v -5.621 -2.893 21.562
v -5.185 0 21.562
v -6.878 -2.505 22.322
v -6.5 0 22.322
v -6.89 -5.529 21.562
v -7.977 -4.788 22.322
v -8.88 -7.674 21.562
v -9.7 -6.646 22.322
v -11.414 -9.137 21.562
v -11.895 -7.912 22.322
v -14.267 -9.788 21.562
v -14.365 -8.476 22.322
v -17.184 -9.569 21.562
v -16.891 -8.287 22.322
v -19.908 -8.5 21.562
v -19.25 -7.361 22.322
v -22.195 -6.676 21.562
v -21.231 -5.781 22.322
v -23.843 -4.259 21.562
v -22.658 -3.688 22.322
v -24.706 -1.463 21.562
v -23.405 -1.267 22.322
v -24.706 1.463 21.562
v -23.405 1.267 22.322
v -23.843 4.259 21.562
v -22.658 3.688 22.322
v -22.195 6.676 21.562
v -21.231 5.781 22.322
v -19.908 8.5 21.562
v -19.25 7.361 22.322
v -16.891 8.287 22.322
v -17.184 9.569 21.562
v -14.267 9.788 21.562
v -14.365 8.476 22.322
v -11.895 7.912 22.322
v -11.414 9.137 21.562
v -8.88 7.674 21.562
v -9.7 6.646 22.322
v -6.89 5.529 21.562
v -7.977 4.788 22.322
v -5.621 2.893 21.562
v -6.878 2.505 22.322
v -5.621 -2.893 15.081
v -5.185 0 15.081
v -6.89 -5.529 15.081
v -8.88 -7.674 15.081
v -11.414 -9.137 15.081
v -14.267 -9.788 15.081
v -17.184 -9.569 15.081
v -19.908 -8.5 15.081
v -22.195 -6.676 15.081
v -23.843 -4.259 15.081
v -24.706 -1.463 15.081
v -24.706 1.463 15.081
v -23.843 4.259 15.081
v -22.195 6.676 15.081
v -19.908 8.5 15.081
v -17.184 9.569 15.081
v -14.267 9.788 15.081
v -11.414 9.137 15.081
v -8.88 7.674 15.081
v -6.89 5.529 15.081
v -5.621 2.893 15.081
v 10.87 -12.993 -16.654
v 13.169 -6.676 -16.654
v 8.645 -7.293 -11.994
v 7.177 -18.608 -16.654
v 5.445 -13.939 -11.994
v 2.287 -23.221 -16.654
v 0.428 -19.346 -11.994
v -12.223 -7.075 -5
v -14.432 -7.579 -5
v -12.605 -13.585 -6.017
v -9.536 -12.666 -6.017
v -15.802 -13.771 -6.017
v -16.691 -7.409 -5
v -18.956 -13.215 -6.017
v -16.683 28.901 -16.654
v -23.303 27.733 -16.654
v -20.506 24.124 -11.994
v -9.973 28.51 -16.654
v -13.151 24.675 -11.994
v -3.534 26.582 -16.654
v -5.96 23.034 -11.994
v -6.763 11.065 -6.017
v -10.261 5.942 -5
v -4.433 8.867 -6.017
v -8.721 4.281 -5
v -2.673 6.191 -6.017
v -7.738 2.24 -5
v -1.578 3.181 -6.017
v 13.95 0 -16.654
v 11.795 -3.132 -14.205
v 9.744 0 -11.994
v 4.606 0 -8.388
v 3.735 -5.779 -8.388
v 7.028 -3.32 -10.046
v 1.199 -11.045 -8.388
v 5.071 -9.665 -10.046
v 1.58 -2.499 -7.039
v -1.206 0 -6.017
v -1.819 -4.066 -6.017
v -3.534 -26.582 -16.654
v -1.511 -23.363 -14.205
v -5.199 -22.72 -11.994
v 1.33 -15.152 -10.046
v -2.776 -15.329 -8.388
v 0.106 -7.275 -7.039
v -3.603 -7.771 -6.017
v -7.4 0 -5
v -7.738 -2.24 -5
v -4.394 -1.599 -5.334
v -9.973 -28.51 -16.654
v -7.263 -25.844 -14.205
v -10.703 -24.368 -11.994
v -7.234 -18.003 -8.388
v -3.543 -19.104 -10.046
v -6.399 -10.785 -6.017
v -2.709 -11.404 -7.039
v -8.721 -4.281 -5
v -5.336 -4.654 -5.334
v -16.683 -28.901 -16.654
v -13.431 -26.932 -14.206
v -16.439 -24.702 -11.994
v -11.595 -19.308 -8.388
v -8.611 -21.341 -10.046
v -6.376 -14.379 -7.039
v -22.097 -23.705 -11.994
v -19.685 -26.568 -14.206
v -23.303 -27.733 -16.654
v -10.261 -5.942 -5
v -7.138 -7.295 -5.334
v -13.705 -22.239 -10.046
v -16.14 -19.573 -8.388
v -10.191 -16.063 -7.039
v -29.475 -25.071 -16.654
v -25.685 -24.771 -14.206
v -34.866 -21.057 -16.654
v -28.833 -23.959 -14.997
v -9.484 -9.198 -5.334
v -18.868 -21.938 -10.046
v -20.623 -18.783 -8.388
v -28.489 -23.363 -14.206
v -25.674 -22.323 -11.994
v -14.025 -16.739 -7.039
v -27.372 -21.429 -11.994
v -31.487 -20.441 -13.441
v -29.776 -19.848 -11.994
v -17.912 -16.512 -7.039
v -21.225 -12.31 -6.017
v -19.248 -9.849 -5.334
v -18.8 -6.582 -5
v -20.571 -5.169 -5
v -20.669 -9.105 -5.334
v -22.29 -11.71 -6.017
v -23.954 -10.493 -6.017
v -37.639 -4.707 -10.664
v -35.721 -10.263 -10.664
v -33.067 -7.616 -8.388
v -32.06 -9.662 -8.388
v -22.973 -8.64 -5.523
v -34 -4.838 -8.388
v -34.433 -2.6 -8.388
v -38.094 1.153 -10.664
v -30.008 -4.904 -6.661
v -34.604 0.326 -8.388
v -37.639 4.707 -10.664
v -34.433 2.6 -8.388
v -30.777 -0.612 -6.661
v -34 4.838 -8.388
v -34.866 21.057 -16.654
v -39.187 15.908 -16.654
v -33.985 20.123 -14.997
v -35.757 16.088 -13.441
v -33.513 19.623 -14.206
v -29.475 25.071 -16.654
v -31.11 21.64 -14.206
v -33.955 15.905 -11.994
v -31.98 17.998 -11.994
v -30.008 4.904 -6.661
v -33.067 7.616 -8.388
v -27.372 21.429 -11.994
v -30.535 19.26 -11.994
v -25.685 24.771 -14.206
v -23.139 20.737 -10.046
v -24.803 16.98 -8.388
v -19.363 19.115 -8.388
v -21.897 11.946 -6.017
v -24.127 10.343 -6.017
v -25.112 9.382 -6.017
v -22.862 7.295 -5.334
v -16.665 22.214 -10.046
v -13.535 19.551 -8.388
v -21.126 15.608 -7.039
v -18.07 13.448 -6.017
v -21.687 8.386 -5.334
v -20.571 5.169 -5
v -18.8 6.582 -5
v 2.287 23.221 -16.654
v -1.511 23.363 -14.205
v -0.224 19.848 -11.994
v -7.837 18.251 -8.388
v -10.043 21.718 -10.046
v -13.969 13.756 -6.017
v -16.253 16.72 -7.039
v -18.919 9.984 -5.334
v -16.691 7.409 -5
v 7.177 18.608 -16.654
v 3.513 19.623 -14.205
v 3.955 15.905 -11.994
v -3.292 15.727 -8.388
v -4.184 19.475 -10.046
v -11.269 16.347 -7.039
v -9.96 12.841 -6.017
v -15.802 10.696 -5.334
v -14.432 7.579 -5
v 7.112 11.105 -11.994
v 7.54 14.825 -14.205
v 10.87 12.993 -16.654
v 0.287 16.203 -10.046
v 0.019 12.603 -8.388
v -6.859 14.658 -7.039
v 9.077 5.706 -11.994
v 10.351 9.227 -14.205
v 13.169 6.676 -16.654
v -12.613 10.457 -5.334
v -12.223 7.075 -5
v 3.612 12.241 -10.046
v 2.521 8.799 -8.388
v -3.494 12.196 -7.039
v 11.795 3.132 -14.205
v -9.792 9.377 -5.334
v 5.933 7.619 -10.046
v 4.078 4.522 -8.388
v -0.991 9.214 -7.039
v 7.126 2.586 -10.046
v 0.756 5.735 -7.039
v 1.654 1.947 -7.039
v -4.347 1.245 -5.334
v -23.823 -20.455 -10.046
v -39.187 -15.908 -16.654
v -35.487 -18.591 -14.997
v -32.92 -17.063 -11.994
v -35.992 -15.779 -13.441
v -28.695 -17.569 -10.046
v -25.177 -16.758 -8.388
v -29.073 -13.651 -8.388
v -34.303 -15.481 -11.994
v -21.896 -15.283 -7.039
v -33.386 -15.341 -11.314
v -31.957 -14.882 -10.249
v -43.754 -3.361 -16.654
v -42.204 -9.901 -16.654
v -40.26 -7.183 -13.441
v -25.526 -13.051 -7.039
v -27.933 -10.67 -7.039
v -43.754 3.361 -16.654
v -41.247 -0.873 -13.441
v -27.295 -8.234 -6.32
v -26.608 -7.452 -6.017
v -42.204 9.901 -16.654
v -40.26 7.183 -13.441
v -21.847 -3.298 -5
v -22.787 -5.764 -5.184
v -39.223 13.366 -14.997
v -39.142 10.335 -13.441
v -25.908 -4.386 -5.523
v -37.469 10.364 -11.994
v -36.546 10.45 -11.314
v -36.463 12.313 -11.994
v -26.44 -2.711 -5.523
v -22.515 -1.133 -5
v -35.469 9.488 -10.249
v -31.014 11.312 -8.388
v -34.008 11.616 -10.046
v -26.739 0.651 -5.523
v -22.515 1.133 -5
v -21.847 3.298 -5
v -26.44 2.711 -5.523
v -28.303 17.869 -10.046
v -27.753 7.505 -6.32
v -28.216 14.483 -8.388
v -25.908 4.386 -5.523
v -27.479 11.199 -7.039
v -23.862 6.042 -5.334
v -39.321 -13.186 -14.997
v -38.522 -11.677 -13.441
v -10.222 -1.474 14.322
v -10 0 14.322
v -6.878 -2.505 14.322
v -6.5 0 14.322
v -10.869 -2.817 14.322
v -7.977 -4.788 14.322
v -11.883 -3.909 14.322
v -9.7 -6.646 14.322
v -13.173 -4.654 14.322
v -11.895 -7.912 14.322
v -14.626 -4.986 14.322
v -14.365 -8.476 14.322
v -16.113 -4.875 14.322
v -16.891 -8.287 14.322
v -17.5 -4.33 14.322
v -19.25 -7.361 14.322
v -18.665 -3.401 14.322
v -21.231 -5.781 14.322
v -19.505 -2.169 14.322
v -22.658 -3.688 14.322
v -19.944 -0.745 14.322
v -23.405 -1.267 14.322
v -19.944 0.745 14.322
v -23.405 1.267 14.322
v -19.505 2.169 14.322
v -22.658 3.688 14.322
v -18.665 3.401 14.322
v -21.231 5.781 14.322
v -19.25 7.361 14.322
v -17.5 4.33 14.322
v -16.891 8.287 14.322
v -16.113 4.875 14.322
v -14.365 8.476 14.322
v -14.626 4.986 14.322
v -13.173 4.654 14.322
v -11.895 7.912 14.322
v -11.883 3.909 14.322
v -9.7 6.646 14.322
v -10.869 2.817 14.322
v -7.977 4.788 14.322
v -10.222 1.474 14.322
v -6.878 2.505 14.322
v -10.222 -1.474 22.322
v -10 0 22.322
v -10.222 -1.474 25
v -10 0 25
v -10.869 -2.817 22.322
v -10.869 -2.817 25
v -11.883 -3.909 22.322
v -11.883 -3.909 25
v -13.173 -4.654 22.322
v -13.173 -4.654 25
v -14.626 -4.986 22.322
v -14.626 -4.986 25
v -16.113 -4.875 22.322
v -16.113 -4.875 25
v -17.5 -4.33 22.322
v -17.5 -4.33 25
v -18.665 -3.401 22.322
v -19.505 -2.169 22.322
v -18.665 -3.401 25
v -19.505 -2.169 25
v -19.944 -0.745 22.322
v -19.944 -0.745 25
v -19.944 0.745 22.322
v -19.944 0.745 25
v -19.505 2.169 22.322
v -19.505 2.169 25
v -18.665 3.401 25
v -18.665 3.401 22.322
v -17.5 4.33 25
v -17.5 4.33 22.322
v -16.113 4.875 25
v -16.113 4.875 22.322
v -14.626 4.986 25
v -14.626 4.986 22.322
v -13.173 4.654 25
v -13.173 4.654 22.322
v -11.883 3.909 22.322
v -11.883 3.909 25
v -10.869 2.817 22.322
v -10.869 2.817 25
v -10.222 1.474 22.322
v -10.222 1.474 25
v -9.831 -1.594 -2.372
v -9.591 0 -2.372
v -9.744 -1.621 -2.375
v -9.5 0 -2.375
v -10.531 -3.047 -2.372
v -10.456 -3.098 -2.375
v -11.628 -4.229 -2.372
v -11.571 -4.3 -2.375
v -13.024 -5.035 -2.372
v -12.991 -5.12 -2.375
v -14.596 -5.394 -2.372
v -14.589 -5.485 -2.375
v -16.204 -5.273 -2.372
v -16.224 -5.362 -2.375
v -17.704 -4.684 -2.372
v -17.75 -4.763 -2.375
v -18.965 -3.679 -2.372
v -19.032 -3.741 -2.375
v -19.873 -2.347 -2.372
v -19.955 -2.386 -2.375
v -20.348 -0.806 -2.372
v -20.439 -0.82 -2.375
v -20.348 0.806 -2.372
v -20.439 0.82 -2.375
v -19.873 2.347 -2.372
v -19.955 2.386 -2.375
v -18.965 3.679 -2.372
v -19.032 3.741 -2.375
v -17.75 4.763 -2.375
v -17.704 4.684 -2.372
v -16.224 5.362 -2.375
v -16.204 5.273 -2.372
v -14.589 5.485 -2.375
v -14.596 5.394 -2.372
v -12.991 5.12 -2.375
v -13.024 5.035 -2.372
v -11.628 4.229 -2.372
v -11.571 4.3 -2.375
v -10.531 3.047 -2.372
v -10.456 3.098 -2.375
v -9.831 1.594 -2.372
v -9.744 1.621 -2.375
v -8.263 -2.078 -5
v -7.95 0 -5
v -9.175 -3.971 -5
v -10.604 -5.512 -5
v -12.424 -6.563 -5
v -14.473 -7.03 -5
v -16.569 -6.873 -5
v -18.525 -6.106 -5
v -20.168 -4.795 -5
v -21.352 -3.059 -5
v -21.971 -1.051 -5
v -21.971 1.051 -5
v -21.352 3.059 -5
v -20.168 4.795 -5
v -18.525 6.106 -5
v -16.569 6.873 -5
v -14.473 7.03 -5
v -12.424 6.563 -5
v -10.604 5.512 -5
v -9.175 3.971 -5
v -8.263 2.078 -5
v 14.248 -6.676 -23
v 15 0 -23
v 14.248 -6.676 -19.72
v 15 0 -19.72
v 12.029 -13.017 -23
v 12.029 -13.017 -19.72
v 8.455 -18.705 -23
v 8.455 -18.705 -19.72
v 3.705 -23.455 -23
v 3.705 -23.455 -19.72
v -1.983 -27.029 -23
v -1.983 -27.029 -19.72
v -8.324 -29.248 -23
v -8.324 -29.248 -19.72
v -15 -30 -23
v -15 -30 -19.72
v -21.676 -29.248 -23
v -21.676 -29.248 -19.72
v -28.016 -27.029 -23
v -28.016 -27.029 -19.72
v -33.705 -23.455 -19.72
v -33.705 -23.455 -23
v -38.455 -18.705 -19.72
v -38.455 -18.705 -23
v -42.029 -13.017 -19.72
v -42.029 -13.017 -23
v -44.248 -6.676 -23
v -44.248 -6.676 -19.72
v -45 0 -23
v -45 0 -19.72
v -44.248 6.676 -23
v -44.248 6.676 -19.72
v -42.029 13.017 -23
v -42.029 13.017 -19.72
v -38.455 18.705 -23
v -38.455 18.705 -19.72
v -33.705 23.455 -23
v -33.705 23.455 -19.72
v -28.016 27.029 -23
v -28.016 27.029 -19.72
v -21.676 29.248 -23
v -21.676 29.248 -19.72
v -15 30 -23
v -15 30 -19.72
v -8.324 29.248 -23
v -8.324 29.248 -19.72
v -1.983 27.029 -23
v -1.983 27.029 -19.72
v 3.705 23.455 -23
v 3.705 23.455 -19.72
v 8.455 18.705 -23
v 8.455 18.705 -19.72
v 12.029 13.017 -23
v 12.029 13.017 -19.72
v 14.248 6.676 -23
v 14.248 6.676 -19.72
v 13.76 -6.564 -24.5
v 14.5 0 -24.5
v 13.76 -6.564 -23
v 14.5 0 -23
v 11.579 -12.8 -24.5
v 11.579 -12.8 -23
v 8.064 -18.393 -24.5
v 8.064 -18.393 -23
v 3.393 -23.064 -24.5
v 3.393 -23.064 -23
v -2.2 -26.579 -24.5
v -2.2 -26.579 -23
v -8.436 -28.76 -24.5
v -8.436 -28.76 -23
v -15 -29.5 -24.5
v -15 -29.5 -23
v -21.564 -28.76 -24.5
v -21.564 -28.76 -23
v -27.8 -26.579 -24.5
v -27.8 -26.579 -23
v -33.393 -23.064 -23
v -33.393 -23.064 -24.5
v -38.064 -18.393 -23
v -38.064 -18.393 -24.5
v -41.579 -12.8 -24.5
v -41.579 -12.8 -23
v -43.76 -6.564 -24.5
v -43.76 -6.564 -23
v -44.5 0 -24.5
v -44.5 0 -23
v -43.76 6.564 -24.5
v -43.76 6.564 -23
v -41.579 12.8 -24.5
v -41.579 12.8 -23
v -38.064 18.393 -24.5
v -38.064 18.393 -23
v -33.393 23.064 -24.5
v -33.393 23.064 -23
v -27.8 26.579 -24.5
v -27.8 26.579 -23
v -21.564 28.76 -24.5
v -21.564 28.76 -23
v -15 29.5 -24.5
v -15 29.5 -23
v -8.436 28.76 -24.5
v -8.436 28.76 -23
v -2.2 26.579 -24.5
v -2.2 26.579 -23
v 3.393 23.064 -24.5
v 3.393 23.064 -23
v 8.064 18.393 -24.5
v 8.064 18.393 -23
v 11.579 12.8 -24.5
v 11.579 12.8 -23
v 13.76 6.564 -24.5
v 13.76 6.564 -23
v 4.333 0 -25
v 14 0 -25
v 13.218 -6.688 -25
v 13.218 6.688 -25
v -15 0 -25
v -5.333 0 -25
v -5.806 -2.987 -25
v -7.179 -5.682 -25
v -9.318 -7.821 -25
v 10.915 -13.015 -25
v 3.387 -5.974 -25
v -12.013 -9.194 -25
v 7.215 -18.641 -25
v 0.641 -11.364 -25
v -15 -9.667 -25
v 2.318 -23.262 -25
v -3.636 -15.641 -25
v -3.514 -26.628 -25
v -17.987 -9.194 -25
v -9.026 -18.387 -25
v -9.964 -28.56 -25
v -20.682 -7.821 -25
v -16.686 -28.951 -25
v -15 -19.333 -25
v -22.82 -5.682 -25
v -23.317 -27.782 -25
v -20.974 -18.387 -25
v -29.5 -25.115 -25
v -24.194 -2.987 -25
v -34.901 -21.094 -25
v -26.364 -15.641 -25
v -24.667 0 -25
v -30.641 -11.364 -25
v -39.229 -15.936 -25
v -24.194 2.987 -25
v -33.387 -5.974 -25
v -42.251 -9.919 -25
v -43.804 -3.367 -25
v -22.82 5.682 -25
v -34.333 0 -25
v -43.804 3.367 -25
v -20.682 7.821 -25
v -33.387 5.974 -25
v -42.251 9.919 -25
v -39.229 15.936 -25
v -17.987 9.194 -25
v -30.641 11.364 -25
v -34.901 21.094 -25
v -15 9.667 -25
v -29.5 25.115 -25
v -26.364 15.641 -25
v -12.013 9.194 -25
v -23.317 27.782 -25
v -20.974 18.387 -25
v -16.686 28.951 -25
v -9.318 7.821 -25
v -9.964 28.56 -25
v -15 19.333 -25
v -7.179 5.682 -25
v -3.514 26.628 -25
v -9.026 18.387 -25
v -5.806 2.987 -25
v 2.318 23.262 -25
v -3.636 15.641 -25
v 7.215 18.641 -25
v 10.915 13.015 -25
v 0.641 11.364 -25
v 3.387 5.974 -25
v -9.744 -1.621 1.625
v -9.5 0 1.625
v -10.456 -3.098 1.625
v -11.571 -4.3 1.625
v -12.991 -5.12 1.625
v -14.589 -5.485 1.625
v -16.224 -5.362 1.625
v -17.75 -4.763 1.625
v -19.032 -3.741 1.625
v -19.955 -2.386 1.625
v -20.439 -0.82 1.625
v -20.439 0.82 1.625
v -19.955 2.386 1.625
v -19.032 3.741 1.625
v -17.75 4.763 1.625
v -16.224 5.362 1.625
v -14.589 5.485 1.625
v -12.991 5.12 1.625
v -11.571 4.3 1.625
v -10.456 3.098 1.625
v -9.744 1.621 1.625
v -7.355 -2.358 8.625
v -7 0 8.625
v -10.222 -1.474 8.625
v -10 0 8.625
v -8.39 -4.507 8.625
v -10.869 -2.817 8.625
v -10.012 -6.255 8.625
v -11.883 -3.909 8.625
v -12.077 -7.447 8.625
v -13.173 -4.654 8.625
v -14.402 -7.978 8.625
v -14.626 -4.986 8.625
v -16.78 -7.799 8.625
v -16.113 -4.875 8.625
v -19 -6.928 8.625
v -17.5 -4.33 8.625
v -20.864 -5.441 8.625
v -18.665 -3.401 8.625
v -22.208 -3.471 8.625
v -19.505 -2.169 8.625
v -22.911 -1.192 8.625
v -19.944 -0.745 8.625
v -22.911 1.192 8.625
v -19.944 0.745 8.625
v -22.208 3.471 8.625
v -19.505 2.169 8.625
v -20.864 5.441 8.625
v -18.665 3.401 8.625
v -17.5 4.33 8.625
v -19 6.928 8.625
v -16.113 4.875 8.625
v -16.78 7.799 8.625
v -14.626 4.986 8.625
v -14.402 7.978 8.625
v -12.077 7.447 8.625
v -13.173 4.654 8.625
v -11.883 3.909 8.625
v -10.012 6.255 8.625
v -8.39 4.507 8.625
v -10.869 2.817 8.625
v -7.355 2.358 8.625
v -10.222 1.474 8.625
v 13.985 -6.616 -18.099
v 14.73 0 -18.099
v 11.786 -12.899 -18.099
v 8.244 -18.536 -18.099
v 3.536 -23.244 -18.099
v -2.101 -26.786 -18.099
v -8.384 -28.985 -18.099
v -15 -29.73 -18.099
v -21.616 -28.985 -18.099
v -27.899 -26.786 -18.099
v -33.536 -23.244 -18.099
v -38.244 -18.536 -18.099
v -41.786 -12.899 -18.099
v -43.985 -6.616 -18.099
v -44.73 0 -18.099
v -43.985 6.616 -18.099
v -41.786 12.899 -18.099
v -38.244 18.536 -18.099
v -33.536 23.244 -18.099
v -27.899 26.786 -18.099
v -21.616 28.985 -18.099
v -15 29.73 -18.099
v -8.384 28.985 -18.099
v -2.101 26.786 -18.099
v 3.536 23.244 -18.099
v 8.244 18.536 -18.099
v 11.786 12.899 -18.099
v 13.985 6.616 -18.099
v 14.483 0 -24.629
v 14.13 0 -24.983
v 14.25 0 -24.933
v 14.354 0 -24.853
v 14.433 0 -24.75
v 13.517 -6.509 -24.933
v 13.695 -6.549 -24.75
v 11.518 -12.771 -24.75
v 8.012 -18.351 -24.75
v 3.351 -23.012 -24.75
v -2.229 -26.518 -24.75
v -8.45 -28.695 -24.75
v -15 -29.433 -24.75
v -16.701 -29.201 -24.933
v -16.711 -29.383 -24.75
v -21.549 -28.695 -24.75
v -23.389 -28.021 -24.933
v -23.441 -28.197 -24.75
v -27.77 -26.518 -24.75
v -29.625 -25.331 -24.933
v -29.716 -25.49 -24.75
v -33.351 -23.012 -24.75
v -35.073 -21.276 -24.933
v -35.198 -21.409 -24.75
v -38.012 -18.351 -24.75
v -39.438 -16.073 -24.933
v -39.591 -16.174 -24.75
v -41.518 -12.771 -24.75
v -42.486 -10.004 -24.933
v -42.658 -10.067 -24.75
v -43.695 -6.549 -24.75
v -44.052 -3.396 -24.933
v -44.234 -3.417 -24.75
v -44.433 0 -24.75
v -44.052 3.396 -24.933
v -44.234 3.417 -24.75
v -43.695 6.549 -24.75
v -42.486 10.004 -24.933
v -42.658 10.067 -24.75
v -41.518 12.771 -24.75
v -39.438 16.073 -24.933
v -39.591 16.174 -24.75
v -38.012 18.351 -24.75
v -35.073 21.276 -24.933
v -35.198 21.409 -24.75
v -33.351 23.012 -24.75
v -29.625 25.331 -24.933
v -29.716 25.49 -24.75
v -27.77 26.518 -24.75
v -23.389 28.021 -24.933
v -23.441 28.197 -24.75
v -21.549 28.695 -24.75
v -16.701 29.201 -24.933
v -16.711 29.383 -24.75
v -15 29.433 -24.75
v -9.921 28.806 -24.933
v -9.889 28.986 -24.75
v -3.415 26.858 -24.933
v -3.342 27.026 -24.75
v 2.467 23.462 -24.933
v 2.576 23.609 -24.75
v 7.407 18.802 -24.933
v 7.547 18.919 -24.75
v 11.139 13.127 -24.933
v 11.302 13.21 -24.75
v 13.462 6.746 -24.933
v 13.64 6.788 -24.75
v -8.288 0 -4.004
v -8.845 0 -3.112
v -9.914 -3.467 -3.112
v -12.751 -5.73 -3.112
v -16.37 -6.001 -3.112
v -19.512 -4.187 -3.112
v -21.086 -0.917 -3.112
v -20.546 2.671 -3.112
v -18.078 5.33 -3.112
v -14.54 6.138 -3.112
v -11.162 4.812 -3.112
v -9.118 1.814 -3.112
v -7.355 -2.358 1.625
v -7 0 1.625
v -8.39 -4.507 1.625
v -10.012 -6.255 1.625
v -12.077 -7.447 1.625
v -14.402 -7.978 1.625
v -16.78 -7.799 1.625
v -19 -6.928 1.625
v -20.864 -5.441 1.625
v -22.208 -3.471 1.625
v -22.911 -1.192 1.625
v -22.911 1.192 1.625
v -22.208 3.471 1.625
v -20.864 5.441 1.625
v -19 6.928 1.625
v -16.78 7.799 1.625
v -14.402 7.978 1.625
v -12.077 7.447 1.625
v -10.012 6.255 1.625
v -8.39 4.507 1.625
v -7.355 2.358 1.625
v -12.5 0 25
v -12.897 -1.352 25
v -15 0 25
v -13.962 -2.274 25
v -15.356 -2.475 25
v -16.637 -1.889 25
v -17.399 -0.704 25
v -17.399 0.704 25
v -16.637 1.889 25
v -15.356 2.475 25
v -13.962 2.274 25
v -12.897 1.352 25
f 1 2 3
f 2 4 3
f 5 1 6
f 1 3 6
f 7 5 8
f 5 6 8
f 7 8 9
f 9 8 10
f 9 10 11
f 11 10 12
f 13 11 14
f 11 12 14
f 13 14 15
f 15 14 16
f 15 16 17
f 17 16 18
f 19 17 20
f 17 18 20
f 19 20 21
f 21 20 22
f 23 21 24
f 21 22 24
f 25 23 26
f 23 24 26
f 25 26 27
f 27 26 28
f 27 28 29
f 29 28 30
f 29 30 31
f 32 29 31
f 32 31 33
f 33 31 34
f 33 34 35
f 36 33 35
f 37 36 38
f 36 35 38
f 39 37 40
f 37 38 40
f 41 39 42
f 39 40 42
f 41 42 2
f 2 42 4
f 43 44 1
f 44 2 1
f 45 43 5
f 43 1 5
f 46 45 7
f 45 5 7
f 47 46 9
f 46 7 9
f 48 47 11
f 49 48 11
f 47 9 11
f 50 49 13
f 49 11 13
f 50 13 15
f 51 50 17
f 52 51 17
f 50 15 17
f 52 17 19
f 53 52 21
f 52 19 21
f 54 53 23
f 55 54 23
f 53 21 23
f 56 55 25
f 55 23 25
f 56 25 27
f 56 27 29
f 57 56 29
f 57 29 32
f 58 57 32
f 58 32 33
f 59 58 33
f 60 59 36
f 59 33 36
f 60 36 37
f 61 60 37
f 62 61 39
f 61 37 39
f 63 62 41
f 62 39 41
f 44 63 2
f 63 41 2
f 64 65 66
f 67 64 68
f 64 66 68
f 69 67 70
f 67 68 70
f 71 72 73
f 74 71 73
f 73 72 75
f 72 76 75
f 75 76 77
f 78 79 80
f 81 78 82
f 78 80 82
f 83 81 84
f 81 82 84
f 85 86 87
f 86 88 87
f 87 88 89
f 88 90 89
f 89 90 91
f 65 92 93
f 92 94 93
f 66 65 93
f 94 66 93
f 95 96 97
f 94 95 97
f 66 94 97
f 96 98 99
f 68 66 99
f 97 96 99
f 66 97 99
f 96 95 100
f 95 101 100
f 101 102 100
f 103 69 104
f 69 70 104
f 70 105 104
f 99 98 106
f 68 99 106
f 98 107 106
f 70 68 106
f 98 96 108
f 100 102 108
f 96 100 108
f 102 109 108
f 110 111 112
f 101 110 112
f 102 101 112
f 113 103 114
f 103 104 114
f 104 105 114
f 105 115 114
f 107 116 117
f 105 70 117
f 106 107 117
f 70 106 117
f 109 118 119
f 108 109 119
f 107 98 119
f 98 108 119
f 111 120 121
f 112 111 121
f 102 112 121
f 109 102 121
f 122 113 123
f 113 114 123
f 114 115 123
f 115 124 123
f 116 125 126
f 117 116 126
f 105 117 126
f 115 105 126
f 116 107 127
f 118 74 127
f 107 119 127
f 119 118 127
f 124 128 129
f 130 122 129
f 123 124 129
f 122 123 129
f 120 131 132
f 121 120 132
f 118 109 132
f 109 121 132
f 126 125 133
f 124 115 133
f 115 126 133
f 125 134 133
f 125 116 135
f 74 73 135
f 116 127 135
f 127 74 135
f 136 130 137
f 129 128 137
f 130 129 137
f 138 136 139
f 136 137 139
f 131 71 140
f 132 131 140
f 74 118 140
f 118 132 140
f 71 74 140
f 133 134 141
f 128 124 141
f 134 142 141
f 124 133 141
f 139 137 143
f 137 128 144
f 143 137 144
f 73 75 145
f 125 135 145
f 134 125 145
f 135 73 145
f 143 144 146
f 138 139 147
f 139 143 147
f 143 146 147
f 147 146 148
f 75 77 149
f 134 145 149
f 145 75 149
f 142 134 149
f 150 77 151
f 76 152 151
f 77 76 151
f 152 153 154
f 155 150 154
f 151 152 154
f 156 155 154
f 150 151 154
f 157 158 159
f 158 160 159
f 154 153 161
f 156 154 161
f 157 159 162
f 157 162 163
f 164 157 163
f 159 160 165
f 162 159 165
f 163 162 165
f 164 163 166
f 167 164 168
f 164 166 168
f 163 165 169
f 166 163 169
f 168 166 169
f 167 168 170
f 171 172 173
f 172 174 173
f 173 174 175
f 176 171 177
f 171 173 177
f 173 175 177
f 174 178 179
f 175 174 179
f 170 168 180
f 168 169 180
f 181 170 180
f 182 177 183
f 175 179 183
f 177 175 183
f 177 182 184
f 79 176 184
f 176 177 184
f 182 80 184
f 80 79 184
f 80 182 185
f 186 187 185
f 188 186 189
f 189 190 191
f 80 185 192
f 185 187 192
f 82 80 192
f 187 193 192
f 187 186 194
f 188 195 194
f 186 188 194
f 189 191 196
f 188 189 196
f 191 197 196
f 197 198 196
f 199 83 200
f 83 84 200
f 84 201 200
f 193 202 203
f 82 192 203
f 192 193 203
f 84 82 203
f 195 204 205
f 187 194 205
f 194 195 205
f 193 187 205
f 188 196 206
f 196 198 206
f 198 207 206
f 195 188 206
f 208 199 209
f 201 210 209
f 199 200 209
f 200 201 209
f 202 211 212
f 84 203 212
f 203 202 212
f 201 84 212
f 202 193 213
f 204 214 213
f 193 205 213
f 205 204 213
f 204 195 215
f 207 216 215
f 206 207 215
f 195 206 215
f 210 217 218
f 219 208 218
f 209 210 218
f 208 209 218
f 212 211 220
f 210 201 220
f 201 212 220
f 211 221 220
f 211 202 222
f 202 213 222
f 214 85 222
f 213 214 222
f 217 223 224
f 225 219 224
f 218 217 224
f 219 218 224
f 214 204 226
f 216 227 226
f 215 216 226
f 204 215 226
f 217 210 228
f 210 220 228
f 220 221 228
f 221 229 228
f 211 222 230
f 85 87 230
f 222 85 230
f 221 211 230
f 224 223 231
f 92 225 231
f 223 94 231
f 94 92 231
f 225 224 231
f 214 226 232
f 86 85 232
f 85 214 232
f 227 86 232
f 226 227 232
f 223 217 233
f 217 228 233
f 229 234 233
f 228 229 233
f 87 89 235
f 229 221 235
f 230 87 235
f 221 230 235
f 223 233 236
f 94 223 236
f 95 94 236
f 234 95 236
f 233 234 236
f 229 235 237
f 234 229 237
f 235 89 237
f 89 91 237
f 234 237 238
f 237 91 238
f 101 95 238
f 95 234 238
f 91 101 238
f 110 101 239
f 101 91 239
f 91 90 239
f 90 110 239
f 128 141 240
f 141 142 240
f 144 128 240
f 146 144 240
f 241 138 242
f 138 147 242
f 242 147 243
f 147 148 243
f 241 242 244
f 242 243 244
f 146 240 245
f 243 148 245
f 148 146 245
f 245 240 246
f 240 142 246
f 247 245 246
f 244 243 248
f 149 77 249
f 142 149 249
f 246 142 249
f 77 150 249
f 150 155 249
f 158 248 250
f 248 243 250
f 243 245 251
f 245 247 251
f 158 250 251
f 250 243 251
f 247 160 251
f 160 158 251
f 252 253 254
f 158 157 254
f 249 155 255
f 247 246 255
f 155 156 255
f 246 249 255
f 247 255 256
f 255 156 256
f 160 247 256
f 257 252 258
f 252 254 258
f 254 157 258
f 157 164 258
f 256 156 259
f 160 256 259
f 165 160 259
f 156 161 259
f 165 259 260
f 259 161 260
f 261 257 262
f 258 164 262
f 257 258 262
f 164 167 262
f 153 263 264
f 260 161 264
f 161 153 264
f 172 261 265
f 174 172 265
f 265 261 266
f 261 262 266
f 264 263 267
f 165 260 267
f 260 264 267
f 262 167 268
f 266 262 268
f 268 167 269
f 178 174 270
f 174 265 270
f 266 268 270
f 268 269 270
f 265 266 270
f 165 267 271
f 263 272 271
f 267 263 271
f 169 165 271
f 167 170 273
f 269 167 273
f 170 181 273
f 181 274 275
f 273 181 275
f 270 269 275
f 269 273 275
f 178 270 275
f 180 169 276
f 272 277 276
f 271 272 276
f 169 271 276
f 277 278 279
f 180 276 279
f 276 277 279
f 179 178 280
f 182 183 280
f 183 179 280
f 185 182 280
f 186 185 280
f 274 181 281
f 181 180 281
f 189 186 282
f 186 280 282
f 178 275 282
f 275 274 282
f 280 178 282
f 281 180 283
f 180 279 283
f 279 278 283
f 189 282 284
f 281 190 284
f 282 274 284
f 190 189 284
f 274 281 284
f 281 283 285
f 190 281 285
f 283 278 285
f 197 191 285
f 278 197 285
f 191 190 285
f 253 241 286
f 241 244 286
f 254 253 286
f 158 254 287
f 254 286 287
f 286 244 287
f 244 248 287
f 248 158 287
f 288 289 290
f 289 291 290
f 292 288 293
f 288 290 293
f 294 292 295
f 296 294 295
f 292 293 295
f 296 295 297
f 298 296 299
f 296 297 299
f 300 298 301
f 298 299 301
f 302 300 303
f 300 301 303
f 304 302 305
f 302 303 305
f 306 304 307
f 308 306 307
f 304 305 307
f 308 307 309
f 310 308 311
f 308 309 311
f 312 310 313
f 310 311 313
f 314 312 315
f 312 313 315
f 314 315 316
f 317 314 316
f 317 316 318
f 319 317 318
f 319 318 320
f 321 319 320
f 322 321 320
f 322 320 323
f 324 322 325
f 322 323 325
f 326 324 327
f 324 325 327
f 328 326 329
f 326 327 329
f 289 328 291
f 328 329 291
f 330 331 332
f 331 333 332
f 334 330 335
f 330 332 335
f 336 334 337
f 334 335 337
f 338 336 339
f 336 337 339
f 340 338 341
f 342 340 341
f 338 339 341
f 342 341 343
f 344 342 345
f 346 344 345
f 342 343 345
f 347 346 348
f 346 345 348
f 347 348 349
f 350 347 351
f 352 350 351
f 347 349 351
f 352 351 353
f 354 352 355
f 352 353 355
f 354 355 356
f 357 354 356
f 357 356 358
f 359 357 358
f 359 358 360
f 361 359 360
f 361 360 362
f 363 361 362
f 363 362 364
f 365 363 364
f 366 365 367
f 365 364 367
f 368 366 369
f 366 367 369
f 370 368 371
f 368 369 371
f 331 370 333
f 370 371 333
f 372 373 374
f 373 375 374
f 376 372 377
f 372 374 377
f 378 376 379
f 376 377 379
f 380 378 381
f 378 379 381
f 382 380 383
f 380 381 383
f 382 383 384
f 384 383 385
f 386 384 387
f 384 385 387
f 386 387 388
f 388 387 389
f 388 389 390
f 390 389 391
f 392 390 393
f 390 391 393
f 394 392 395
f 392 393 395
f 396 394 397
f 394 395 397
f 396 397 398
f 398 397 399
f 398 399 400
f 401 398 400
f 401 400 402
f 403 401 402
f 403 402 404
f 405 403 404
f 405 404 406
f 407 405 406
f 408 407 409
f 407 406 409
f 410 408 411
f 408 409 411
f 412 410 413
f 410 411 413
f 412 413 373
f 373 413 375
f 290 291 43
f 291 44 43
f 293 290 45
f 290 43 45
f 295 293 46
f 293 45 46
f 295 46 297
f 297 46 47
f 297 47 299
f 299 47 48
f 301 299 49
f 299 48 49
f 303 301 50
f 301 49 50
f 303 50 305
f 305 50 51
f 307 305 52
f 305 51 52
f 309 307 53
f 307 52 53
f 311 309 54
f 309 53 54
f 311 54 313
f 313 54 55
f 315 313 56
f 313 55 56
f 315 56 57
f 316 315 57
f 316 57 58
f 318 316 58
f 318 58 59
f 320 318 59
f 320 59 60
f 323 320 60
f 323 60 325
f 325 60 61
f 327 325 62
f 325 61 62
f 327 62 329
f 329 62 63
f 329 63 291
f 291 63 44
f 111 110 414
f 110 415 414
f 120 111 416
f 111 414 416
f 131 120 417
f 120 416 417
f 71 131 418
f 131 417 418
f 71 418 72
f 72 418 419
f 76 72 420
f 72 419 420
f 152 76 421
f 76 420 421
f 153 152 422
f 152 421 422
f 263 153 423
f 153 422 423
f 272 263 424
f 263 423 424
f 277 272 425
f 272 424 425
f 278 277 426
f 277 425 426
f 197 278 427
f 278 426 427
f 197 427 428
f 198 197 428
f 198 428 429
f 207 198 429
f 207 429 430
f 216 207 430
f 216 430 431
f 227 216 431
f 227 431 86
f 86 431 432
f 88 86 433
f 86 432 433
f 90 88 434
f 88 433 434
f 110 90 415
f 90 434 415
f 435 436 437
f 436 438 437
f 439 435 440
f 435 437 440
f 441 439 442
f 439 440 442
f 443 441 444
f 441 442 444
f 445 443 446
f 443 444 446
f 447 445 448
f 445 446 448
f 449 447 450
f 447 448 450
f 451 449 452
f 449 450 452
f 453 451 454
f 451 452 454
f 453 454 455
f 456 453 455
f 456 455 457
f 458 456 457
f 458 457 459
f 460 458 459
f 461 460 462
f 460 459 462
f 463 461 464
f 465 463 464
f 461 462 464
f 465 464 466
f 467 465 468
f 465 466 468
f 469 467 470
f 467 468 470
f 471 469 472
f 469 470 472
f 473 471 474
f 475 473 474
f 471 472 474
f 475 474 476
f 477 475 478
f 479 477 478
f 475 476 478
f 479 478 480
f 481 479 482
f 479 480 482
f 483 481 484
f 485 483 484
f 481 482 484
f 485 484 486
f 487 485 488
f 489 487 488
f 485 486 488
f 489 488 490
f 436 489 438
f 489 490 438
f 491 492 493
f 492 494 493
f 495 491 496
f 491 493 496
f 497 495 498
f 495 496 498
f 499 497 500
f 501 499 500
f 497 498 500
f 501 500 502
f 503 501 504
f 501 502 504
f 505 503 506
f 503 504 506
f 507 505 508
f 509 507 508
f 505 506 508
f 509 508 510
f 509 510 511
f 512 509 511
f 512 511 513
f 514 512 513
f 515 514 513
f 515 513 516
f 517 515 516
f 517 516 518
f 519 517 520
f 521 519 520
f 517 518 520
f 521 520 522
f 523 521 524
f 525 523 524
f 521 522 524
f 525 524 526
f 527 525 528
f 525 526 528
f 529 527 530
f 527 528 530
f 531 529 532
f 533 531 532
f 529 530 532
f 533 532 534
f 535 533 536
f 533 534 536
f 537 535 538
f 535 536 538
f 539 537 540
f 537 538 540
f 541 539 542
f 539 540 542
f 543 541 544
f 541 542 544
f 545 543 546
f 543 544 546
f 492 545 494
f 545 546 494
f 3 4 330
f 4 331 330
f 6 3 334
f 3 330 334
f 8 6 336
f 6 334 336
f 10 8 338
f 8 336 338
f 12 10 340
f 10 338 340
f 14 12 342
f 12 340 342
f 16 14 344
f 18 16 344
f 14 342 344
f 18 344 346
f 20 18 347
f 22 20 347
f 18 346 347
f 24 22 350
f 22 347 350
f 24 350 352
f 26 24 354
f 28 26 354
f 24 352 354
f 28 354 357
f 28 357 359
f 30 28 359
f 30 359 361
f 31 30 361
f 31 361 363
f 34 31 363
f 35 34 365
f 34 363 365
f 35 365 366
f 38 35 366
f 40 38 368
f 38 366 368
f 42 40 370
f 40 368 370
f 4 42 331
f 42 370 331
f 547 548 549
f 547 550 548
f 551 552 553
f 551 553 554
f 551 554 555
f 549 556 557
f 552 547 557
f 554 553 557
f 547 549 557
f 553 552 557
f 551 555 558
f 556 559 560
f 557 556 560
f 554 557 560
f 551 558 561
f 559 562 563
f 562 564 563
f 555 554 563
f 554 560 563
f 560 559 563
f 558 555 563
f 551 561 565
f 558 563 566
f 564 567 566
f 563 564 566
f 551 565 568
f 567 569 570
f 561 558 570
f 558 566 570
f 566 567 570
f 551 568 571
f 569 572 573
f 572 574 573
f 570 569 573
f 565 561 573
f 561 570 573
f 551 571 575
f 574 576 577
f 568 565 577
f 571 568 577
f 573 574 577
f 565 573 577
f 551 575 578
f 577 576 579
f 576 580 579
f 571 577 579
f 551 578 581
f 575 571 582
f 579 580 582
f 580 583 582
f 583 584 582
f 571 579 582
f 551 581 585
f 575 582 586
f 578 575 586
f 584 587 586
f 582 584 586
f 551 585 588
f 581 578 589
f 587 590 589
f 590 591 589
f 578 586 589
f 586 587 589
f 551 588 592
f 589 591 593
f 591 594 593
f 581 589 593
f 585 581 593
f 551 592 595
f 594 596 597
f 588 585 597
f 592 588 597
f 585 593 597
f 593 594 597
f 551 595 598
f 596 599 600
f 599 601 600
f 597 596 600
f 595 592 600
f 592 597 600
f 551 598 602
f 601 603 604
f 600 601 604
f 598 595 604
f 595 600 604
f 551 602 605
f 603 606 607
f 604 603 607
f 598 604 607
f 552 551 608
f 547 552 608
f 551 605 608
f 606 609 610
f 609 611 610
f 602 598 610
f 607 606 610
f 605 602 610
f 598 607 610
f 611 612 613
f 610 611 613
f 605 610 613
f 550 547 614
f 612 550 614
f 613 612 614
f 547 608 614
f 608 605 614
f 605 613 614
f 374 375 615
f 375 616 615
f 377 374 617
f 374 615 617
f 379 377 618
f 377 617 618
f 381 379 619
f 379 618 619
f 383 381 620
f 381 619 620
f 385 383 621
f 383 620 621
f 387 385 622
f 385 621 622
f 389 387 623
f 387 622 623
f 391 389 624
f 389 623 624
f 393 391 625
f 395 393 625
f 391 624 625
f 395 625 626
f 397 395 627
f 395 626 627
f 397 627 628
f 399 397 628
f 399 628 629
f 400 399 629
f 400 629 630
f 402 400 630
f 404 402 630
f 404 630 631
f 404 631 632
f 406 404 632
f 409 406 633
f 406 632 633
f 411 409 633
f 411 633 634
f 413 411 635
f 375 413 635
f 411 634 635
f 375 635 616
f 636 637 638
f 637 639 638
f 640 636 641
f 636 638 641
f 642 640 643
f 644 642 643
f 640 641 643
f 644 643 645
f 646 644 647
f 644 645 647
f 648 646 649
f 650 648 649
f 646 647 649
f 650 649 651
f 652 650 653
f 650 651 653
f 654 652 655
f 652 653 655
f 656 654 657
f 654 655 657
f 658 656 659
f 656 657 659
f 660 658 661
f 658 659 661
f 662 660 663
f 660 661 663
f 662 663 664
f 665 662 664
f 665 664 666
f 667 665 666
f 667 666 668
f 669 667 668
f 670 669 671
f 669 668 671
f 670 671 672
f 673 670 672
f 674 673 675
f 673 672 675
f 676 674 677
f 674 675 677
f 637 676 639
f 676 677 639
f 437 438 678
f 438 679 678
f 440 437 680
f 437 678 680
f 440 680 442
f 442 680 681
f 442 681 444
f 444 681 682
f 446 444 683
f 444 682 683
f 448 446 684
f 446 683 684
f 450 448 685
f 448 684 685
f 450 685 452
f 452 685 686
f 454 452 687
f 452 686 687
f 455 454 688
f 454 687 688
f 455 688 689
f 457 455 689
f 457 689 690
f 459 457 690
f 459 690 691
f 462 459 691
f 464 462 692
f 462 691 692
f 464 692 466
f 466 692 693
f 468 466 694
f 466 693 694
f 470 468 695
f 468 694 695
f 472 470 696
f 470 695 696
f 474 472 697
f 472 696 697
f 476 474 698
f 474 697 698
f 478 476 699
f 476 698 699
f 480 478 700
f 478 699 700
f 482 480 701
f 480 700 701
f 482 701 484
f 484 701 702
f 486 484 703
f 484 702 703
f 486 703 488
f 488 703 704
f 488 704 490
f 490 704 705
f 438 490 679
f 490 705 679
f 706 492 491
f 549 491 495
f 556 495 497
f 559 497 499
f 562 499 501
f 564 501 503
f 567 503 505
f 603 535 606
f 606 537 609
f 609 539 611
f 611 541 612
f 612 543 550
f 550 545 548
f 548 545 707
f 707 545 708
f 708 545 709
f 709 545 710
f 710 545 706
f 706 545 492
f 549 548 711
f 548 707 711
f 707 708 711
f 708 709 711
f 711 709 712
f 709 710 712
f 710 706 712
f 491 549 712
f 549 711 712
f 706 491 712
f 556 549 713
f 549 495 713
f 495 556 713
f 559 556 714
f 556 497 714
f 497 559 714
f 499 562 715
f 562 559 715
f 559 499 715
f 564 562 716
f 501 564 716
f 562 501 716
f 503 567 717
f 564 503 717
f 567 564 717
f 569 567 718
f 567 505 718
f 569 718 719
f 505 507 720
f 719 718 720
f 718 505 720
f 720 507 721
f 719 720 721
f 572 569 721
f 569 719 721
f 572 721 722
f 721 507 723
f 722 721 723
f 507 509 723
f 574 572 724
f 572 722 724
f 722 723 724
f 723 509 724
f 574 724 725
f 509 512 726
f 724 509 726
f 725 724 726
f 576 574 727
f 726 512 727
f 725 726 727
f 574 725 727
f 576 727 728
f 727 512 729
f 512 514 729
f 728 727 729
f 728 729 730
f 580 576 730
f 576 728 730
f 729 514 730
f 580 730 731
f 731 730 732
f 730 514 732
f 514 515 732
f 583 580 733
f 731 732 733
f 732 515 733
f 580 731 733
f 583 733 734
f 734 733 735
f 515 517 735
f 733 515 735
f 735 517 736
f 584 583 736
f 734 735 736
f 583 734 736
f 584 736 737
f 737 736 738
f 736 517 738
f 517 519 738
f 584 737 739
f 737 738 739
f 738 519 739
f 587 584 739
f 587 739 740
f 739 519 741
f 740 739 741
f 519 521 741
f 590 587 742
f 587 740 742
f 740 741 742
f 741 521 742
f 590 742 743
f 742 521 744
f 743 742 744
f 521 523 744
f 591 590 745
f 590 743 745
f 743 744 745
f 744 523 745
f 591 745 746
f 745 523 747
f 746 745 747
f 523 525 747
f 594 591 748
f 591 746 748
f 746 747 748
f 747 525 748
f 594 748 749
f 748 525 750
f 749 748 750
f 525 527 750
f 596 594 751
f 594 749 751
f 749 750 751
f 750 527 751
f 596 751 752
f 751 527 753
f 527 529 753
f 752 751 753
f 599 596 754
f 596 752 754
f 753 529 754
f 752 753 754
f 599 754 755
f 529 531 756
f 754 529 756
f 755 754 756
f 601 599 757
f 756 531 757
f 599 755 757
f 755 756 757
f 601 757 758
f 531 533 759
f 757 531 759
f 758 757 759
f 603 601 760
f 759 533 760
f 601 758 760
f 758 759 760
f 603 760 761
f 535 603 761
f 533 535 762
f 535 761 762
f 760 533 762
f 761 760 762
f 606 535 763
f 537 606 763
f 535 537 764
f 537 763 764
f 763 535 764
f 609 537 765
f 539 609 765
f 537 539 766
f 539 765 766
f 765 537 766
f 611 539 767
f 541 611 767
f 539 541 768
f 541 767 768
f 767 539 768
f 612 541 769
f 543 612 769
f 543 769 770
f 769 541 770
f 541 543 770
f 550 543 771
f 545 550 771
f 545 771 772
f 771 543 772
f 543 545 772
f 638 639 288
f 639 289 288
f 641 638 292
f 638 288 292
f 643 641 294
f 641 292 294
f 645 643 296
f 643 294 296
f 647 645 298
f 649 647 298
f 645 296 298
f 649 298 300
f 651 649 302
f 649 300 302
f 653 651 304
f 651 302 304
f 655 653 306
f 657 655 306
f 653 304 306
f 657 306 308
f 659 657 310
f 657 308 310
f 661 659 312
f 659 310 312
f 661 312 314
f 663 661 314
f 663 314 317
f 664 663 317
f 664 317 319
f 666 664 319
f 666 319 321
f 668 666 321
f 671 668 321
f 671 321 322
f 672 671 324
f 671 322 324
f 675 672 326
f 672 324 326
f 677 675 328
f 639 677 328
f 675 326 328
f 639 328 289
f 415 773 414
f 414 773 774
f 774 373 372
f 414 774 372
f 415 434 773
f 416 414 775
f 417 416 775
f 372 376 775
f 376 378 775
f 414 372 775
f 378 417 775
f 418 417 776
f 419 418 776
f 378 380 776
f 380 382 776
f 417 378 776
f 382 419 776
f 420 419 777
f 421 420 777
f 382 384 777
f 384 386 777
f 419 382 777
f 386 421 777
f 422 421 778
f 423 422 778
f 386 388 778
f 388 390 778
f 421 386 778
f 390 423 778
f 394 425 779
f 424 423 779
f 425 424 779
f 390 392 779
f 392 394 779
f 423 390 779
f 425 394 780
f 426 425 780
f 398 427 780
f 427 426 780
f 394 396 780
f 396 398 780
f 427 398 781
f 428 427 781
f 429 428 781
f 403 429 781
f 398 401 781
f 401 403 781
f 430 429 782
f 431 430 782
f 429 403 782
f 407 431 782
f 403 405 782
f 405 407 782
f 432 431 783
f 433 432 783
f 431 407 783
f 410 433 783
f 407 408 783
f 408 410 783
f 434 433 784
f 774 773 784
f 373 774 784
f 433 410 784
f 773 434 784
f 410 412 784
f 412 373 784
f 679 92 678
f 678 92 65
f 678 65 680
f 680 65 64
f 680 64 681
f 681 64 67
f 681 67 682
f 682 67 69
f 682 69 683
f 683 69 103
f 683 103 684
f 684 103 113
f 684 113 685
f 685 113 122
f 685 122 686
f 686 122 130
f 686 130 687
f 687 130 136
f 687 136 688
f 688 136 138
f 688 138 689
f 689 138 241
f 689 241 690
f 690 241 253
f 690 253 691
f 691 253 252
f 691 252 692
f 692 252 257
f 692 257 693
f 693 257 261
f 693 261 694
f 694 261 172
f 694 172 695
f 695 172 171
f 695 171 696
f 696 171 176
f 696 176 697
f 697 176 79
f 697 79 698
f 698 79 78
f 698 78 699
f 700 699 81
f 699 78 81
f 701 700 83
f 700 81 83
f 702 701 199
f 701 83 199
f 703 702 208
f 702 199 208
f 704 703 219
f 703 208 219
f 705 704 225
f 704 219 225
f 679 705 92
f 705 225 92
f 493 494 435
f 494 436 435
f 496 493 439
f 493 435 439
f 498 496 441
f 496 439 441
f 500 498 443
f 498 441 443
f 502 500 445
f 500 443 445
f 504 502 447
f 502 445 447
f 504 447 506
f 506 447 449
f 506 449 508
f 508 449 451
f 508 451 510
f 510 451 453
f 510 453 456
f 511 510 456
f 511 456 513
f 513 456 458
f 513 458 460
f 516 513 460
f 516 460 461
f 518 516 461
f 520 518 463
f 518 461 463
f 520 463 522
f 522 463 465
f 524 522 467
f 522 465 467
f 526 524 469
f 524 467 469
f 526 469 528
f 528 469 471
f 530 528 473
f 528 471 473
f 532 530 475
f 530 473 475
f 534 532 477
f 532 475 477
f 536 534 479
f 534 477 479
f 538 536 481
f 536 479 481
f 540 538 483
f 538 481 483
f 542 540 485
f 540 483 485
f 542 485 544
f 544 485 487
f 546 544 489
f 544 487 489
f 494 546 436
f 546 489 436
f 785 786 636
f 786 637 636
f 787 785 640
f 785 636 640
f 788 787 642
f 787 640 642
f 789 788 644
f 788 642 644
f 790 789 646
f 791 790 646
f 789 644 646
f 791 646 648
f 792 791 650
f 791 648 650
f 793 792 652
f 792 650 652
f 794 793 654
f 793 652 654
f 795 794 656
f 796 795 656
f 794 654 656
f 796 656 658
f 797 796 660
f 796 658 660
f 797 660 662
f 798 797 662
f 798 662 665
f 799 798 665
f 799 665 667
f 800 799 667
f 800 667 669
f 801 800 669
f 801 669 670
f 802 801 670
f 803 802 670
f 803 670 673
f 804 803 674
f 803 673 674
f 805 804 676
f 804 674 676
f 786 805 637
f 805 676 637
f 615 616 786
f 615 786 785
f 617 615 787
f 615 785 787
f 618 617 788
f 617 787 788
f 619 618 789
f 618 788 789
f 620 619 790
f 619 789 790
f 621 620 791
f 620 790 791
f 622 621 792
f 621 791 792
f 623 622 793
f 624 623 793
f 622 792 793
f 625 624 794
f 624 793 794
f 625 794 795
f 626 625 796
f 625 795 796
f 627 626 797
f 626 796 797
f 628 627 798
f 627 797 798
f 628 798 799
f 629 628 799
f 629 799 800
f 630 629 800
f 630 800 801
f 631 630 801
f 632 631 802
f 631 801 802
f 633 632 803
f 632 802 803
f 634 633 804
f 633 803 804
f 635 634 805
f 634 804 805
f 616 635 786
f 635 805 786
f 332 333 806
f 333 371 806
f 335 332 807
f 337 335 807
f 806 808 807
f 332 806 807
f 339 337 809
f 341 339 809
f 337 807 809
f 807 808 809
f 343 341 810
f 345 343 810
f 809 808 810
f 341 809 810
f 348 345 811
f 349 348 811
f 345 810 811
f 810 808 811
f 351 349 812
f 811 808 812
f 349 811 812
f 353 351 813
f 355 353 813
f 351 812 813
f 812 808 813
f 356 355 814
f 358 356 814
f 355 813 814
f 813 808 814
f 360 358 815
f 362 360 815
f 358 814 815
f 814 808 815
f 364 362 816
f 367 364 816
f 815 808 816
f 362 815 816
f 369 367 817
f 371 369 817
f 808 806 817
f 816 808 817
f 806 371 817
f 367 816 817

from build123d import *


# Not quite as in the source:
# - ends of sketch curves that miss each other by under 0.0002 mm in the source are joined


with BuildPart() as f1:
    # F0 (on Front) → F1 (revolve)
    with BuildSketch(Plane.XZ):
        with BuildLine():
            Line((-7.3999762, -4.999923), (-7.9499112, -4.999876))
            ThreePointArc((-7.9499112, -4.999876), (-8.5406711809, -3.5422157753), (-9.5911861302, -2.3716649112))
            Line((-9.5911861302, -2.3716649112), (-9.4998722, -2.374884))
            Line((-9.4998722, -2.374884), (-9.4998722, 1.625069))
            Line((-9.4998722, 1.625069), (-7.0000502, 1.625069))
            Line((-7.0000502, 1.625069), (-7.0000502, 8.625047))
            Line((-7.0000502, 8.625047), (-10.0000742, 8.625047))
            Line((-10.0000742, 8.625047), (-10.0000742, 14.321571))
            Line((-10.0000742, 14.321571), (-6.5000852, 14.321571))
            Line((-6.5000852, 14.321571), (-5.1849672, 15.080816))
            Line((-5.1849672, 15.080816), (-5.1849672, 21.562471))
            Line((-5.1849672, 21.562471), (-6.5000852, 22.321597))
            Line((-6.5000852, 22.321597), (-10.0000742, 22.321597))
            Line((-10.0000742, 22.321597), (-10.0000742, 25))
            Line((-10.0000742, 25), (-15.0000762, 25))
            Line((-15.0000762, 25), (-15.0000697718, 22.3215925))
            Line((-15.0000697718, 22.3215925), (-15.0000505717, 14.3215729999))
            Line((-15.0000505717, 14.3215729999), (-14.9999562, -25))
            Line((-14.9999562, -25), (4.9999238, -25))
            Line((4.9999238, -25), (14.0001218, -25))
            ThreePointArc((14.0001218, -25), (14.3536028976, -24.8535000977), (14.5000498, -24.499946))
            Line((14.5000498, -24.499946), (14.5000868, -22.999904))
            Line((14.5000868, -22.999904), (15.0000508, -22.999904))
            Line((15.0000508, -22.999904), (15.0000508, -19.719976))
            Line((15.0000508, -19.719976), (14.7301608, -18.099323))
            Line((14.7301608, -18.099323), (13.9495778, -16.653671))
            ThreePointArc((13.9495778, -16.653671), (4.6062496949, -8.3875220734), (-7.3999762, -4.999923))
        make_face()
    revolve(axis=Axis((-15.0000162, 0, 0), (2.4e-06, 0, -1)))


solid = f1.part
